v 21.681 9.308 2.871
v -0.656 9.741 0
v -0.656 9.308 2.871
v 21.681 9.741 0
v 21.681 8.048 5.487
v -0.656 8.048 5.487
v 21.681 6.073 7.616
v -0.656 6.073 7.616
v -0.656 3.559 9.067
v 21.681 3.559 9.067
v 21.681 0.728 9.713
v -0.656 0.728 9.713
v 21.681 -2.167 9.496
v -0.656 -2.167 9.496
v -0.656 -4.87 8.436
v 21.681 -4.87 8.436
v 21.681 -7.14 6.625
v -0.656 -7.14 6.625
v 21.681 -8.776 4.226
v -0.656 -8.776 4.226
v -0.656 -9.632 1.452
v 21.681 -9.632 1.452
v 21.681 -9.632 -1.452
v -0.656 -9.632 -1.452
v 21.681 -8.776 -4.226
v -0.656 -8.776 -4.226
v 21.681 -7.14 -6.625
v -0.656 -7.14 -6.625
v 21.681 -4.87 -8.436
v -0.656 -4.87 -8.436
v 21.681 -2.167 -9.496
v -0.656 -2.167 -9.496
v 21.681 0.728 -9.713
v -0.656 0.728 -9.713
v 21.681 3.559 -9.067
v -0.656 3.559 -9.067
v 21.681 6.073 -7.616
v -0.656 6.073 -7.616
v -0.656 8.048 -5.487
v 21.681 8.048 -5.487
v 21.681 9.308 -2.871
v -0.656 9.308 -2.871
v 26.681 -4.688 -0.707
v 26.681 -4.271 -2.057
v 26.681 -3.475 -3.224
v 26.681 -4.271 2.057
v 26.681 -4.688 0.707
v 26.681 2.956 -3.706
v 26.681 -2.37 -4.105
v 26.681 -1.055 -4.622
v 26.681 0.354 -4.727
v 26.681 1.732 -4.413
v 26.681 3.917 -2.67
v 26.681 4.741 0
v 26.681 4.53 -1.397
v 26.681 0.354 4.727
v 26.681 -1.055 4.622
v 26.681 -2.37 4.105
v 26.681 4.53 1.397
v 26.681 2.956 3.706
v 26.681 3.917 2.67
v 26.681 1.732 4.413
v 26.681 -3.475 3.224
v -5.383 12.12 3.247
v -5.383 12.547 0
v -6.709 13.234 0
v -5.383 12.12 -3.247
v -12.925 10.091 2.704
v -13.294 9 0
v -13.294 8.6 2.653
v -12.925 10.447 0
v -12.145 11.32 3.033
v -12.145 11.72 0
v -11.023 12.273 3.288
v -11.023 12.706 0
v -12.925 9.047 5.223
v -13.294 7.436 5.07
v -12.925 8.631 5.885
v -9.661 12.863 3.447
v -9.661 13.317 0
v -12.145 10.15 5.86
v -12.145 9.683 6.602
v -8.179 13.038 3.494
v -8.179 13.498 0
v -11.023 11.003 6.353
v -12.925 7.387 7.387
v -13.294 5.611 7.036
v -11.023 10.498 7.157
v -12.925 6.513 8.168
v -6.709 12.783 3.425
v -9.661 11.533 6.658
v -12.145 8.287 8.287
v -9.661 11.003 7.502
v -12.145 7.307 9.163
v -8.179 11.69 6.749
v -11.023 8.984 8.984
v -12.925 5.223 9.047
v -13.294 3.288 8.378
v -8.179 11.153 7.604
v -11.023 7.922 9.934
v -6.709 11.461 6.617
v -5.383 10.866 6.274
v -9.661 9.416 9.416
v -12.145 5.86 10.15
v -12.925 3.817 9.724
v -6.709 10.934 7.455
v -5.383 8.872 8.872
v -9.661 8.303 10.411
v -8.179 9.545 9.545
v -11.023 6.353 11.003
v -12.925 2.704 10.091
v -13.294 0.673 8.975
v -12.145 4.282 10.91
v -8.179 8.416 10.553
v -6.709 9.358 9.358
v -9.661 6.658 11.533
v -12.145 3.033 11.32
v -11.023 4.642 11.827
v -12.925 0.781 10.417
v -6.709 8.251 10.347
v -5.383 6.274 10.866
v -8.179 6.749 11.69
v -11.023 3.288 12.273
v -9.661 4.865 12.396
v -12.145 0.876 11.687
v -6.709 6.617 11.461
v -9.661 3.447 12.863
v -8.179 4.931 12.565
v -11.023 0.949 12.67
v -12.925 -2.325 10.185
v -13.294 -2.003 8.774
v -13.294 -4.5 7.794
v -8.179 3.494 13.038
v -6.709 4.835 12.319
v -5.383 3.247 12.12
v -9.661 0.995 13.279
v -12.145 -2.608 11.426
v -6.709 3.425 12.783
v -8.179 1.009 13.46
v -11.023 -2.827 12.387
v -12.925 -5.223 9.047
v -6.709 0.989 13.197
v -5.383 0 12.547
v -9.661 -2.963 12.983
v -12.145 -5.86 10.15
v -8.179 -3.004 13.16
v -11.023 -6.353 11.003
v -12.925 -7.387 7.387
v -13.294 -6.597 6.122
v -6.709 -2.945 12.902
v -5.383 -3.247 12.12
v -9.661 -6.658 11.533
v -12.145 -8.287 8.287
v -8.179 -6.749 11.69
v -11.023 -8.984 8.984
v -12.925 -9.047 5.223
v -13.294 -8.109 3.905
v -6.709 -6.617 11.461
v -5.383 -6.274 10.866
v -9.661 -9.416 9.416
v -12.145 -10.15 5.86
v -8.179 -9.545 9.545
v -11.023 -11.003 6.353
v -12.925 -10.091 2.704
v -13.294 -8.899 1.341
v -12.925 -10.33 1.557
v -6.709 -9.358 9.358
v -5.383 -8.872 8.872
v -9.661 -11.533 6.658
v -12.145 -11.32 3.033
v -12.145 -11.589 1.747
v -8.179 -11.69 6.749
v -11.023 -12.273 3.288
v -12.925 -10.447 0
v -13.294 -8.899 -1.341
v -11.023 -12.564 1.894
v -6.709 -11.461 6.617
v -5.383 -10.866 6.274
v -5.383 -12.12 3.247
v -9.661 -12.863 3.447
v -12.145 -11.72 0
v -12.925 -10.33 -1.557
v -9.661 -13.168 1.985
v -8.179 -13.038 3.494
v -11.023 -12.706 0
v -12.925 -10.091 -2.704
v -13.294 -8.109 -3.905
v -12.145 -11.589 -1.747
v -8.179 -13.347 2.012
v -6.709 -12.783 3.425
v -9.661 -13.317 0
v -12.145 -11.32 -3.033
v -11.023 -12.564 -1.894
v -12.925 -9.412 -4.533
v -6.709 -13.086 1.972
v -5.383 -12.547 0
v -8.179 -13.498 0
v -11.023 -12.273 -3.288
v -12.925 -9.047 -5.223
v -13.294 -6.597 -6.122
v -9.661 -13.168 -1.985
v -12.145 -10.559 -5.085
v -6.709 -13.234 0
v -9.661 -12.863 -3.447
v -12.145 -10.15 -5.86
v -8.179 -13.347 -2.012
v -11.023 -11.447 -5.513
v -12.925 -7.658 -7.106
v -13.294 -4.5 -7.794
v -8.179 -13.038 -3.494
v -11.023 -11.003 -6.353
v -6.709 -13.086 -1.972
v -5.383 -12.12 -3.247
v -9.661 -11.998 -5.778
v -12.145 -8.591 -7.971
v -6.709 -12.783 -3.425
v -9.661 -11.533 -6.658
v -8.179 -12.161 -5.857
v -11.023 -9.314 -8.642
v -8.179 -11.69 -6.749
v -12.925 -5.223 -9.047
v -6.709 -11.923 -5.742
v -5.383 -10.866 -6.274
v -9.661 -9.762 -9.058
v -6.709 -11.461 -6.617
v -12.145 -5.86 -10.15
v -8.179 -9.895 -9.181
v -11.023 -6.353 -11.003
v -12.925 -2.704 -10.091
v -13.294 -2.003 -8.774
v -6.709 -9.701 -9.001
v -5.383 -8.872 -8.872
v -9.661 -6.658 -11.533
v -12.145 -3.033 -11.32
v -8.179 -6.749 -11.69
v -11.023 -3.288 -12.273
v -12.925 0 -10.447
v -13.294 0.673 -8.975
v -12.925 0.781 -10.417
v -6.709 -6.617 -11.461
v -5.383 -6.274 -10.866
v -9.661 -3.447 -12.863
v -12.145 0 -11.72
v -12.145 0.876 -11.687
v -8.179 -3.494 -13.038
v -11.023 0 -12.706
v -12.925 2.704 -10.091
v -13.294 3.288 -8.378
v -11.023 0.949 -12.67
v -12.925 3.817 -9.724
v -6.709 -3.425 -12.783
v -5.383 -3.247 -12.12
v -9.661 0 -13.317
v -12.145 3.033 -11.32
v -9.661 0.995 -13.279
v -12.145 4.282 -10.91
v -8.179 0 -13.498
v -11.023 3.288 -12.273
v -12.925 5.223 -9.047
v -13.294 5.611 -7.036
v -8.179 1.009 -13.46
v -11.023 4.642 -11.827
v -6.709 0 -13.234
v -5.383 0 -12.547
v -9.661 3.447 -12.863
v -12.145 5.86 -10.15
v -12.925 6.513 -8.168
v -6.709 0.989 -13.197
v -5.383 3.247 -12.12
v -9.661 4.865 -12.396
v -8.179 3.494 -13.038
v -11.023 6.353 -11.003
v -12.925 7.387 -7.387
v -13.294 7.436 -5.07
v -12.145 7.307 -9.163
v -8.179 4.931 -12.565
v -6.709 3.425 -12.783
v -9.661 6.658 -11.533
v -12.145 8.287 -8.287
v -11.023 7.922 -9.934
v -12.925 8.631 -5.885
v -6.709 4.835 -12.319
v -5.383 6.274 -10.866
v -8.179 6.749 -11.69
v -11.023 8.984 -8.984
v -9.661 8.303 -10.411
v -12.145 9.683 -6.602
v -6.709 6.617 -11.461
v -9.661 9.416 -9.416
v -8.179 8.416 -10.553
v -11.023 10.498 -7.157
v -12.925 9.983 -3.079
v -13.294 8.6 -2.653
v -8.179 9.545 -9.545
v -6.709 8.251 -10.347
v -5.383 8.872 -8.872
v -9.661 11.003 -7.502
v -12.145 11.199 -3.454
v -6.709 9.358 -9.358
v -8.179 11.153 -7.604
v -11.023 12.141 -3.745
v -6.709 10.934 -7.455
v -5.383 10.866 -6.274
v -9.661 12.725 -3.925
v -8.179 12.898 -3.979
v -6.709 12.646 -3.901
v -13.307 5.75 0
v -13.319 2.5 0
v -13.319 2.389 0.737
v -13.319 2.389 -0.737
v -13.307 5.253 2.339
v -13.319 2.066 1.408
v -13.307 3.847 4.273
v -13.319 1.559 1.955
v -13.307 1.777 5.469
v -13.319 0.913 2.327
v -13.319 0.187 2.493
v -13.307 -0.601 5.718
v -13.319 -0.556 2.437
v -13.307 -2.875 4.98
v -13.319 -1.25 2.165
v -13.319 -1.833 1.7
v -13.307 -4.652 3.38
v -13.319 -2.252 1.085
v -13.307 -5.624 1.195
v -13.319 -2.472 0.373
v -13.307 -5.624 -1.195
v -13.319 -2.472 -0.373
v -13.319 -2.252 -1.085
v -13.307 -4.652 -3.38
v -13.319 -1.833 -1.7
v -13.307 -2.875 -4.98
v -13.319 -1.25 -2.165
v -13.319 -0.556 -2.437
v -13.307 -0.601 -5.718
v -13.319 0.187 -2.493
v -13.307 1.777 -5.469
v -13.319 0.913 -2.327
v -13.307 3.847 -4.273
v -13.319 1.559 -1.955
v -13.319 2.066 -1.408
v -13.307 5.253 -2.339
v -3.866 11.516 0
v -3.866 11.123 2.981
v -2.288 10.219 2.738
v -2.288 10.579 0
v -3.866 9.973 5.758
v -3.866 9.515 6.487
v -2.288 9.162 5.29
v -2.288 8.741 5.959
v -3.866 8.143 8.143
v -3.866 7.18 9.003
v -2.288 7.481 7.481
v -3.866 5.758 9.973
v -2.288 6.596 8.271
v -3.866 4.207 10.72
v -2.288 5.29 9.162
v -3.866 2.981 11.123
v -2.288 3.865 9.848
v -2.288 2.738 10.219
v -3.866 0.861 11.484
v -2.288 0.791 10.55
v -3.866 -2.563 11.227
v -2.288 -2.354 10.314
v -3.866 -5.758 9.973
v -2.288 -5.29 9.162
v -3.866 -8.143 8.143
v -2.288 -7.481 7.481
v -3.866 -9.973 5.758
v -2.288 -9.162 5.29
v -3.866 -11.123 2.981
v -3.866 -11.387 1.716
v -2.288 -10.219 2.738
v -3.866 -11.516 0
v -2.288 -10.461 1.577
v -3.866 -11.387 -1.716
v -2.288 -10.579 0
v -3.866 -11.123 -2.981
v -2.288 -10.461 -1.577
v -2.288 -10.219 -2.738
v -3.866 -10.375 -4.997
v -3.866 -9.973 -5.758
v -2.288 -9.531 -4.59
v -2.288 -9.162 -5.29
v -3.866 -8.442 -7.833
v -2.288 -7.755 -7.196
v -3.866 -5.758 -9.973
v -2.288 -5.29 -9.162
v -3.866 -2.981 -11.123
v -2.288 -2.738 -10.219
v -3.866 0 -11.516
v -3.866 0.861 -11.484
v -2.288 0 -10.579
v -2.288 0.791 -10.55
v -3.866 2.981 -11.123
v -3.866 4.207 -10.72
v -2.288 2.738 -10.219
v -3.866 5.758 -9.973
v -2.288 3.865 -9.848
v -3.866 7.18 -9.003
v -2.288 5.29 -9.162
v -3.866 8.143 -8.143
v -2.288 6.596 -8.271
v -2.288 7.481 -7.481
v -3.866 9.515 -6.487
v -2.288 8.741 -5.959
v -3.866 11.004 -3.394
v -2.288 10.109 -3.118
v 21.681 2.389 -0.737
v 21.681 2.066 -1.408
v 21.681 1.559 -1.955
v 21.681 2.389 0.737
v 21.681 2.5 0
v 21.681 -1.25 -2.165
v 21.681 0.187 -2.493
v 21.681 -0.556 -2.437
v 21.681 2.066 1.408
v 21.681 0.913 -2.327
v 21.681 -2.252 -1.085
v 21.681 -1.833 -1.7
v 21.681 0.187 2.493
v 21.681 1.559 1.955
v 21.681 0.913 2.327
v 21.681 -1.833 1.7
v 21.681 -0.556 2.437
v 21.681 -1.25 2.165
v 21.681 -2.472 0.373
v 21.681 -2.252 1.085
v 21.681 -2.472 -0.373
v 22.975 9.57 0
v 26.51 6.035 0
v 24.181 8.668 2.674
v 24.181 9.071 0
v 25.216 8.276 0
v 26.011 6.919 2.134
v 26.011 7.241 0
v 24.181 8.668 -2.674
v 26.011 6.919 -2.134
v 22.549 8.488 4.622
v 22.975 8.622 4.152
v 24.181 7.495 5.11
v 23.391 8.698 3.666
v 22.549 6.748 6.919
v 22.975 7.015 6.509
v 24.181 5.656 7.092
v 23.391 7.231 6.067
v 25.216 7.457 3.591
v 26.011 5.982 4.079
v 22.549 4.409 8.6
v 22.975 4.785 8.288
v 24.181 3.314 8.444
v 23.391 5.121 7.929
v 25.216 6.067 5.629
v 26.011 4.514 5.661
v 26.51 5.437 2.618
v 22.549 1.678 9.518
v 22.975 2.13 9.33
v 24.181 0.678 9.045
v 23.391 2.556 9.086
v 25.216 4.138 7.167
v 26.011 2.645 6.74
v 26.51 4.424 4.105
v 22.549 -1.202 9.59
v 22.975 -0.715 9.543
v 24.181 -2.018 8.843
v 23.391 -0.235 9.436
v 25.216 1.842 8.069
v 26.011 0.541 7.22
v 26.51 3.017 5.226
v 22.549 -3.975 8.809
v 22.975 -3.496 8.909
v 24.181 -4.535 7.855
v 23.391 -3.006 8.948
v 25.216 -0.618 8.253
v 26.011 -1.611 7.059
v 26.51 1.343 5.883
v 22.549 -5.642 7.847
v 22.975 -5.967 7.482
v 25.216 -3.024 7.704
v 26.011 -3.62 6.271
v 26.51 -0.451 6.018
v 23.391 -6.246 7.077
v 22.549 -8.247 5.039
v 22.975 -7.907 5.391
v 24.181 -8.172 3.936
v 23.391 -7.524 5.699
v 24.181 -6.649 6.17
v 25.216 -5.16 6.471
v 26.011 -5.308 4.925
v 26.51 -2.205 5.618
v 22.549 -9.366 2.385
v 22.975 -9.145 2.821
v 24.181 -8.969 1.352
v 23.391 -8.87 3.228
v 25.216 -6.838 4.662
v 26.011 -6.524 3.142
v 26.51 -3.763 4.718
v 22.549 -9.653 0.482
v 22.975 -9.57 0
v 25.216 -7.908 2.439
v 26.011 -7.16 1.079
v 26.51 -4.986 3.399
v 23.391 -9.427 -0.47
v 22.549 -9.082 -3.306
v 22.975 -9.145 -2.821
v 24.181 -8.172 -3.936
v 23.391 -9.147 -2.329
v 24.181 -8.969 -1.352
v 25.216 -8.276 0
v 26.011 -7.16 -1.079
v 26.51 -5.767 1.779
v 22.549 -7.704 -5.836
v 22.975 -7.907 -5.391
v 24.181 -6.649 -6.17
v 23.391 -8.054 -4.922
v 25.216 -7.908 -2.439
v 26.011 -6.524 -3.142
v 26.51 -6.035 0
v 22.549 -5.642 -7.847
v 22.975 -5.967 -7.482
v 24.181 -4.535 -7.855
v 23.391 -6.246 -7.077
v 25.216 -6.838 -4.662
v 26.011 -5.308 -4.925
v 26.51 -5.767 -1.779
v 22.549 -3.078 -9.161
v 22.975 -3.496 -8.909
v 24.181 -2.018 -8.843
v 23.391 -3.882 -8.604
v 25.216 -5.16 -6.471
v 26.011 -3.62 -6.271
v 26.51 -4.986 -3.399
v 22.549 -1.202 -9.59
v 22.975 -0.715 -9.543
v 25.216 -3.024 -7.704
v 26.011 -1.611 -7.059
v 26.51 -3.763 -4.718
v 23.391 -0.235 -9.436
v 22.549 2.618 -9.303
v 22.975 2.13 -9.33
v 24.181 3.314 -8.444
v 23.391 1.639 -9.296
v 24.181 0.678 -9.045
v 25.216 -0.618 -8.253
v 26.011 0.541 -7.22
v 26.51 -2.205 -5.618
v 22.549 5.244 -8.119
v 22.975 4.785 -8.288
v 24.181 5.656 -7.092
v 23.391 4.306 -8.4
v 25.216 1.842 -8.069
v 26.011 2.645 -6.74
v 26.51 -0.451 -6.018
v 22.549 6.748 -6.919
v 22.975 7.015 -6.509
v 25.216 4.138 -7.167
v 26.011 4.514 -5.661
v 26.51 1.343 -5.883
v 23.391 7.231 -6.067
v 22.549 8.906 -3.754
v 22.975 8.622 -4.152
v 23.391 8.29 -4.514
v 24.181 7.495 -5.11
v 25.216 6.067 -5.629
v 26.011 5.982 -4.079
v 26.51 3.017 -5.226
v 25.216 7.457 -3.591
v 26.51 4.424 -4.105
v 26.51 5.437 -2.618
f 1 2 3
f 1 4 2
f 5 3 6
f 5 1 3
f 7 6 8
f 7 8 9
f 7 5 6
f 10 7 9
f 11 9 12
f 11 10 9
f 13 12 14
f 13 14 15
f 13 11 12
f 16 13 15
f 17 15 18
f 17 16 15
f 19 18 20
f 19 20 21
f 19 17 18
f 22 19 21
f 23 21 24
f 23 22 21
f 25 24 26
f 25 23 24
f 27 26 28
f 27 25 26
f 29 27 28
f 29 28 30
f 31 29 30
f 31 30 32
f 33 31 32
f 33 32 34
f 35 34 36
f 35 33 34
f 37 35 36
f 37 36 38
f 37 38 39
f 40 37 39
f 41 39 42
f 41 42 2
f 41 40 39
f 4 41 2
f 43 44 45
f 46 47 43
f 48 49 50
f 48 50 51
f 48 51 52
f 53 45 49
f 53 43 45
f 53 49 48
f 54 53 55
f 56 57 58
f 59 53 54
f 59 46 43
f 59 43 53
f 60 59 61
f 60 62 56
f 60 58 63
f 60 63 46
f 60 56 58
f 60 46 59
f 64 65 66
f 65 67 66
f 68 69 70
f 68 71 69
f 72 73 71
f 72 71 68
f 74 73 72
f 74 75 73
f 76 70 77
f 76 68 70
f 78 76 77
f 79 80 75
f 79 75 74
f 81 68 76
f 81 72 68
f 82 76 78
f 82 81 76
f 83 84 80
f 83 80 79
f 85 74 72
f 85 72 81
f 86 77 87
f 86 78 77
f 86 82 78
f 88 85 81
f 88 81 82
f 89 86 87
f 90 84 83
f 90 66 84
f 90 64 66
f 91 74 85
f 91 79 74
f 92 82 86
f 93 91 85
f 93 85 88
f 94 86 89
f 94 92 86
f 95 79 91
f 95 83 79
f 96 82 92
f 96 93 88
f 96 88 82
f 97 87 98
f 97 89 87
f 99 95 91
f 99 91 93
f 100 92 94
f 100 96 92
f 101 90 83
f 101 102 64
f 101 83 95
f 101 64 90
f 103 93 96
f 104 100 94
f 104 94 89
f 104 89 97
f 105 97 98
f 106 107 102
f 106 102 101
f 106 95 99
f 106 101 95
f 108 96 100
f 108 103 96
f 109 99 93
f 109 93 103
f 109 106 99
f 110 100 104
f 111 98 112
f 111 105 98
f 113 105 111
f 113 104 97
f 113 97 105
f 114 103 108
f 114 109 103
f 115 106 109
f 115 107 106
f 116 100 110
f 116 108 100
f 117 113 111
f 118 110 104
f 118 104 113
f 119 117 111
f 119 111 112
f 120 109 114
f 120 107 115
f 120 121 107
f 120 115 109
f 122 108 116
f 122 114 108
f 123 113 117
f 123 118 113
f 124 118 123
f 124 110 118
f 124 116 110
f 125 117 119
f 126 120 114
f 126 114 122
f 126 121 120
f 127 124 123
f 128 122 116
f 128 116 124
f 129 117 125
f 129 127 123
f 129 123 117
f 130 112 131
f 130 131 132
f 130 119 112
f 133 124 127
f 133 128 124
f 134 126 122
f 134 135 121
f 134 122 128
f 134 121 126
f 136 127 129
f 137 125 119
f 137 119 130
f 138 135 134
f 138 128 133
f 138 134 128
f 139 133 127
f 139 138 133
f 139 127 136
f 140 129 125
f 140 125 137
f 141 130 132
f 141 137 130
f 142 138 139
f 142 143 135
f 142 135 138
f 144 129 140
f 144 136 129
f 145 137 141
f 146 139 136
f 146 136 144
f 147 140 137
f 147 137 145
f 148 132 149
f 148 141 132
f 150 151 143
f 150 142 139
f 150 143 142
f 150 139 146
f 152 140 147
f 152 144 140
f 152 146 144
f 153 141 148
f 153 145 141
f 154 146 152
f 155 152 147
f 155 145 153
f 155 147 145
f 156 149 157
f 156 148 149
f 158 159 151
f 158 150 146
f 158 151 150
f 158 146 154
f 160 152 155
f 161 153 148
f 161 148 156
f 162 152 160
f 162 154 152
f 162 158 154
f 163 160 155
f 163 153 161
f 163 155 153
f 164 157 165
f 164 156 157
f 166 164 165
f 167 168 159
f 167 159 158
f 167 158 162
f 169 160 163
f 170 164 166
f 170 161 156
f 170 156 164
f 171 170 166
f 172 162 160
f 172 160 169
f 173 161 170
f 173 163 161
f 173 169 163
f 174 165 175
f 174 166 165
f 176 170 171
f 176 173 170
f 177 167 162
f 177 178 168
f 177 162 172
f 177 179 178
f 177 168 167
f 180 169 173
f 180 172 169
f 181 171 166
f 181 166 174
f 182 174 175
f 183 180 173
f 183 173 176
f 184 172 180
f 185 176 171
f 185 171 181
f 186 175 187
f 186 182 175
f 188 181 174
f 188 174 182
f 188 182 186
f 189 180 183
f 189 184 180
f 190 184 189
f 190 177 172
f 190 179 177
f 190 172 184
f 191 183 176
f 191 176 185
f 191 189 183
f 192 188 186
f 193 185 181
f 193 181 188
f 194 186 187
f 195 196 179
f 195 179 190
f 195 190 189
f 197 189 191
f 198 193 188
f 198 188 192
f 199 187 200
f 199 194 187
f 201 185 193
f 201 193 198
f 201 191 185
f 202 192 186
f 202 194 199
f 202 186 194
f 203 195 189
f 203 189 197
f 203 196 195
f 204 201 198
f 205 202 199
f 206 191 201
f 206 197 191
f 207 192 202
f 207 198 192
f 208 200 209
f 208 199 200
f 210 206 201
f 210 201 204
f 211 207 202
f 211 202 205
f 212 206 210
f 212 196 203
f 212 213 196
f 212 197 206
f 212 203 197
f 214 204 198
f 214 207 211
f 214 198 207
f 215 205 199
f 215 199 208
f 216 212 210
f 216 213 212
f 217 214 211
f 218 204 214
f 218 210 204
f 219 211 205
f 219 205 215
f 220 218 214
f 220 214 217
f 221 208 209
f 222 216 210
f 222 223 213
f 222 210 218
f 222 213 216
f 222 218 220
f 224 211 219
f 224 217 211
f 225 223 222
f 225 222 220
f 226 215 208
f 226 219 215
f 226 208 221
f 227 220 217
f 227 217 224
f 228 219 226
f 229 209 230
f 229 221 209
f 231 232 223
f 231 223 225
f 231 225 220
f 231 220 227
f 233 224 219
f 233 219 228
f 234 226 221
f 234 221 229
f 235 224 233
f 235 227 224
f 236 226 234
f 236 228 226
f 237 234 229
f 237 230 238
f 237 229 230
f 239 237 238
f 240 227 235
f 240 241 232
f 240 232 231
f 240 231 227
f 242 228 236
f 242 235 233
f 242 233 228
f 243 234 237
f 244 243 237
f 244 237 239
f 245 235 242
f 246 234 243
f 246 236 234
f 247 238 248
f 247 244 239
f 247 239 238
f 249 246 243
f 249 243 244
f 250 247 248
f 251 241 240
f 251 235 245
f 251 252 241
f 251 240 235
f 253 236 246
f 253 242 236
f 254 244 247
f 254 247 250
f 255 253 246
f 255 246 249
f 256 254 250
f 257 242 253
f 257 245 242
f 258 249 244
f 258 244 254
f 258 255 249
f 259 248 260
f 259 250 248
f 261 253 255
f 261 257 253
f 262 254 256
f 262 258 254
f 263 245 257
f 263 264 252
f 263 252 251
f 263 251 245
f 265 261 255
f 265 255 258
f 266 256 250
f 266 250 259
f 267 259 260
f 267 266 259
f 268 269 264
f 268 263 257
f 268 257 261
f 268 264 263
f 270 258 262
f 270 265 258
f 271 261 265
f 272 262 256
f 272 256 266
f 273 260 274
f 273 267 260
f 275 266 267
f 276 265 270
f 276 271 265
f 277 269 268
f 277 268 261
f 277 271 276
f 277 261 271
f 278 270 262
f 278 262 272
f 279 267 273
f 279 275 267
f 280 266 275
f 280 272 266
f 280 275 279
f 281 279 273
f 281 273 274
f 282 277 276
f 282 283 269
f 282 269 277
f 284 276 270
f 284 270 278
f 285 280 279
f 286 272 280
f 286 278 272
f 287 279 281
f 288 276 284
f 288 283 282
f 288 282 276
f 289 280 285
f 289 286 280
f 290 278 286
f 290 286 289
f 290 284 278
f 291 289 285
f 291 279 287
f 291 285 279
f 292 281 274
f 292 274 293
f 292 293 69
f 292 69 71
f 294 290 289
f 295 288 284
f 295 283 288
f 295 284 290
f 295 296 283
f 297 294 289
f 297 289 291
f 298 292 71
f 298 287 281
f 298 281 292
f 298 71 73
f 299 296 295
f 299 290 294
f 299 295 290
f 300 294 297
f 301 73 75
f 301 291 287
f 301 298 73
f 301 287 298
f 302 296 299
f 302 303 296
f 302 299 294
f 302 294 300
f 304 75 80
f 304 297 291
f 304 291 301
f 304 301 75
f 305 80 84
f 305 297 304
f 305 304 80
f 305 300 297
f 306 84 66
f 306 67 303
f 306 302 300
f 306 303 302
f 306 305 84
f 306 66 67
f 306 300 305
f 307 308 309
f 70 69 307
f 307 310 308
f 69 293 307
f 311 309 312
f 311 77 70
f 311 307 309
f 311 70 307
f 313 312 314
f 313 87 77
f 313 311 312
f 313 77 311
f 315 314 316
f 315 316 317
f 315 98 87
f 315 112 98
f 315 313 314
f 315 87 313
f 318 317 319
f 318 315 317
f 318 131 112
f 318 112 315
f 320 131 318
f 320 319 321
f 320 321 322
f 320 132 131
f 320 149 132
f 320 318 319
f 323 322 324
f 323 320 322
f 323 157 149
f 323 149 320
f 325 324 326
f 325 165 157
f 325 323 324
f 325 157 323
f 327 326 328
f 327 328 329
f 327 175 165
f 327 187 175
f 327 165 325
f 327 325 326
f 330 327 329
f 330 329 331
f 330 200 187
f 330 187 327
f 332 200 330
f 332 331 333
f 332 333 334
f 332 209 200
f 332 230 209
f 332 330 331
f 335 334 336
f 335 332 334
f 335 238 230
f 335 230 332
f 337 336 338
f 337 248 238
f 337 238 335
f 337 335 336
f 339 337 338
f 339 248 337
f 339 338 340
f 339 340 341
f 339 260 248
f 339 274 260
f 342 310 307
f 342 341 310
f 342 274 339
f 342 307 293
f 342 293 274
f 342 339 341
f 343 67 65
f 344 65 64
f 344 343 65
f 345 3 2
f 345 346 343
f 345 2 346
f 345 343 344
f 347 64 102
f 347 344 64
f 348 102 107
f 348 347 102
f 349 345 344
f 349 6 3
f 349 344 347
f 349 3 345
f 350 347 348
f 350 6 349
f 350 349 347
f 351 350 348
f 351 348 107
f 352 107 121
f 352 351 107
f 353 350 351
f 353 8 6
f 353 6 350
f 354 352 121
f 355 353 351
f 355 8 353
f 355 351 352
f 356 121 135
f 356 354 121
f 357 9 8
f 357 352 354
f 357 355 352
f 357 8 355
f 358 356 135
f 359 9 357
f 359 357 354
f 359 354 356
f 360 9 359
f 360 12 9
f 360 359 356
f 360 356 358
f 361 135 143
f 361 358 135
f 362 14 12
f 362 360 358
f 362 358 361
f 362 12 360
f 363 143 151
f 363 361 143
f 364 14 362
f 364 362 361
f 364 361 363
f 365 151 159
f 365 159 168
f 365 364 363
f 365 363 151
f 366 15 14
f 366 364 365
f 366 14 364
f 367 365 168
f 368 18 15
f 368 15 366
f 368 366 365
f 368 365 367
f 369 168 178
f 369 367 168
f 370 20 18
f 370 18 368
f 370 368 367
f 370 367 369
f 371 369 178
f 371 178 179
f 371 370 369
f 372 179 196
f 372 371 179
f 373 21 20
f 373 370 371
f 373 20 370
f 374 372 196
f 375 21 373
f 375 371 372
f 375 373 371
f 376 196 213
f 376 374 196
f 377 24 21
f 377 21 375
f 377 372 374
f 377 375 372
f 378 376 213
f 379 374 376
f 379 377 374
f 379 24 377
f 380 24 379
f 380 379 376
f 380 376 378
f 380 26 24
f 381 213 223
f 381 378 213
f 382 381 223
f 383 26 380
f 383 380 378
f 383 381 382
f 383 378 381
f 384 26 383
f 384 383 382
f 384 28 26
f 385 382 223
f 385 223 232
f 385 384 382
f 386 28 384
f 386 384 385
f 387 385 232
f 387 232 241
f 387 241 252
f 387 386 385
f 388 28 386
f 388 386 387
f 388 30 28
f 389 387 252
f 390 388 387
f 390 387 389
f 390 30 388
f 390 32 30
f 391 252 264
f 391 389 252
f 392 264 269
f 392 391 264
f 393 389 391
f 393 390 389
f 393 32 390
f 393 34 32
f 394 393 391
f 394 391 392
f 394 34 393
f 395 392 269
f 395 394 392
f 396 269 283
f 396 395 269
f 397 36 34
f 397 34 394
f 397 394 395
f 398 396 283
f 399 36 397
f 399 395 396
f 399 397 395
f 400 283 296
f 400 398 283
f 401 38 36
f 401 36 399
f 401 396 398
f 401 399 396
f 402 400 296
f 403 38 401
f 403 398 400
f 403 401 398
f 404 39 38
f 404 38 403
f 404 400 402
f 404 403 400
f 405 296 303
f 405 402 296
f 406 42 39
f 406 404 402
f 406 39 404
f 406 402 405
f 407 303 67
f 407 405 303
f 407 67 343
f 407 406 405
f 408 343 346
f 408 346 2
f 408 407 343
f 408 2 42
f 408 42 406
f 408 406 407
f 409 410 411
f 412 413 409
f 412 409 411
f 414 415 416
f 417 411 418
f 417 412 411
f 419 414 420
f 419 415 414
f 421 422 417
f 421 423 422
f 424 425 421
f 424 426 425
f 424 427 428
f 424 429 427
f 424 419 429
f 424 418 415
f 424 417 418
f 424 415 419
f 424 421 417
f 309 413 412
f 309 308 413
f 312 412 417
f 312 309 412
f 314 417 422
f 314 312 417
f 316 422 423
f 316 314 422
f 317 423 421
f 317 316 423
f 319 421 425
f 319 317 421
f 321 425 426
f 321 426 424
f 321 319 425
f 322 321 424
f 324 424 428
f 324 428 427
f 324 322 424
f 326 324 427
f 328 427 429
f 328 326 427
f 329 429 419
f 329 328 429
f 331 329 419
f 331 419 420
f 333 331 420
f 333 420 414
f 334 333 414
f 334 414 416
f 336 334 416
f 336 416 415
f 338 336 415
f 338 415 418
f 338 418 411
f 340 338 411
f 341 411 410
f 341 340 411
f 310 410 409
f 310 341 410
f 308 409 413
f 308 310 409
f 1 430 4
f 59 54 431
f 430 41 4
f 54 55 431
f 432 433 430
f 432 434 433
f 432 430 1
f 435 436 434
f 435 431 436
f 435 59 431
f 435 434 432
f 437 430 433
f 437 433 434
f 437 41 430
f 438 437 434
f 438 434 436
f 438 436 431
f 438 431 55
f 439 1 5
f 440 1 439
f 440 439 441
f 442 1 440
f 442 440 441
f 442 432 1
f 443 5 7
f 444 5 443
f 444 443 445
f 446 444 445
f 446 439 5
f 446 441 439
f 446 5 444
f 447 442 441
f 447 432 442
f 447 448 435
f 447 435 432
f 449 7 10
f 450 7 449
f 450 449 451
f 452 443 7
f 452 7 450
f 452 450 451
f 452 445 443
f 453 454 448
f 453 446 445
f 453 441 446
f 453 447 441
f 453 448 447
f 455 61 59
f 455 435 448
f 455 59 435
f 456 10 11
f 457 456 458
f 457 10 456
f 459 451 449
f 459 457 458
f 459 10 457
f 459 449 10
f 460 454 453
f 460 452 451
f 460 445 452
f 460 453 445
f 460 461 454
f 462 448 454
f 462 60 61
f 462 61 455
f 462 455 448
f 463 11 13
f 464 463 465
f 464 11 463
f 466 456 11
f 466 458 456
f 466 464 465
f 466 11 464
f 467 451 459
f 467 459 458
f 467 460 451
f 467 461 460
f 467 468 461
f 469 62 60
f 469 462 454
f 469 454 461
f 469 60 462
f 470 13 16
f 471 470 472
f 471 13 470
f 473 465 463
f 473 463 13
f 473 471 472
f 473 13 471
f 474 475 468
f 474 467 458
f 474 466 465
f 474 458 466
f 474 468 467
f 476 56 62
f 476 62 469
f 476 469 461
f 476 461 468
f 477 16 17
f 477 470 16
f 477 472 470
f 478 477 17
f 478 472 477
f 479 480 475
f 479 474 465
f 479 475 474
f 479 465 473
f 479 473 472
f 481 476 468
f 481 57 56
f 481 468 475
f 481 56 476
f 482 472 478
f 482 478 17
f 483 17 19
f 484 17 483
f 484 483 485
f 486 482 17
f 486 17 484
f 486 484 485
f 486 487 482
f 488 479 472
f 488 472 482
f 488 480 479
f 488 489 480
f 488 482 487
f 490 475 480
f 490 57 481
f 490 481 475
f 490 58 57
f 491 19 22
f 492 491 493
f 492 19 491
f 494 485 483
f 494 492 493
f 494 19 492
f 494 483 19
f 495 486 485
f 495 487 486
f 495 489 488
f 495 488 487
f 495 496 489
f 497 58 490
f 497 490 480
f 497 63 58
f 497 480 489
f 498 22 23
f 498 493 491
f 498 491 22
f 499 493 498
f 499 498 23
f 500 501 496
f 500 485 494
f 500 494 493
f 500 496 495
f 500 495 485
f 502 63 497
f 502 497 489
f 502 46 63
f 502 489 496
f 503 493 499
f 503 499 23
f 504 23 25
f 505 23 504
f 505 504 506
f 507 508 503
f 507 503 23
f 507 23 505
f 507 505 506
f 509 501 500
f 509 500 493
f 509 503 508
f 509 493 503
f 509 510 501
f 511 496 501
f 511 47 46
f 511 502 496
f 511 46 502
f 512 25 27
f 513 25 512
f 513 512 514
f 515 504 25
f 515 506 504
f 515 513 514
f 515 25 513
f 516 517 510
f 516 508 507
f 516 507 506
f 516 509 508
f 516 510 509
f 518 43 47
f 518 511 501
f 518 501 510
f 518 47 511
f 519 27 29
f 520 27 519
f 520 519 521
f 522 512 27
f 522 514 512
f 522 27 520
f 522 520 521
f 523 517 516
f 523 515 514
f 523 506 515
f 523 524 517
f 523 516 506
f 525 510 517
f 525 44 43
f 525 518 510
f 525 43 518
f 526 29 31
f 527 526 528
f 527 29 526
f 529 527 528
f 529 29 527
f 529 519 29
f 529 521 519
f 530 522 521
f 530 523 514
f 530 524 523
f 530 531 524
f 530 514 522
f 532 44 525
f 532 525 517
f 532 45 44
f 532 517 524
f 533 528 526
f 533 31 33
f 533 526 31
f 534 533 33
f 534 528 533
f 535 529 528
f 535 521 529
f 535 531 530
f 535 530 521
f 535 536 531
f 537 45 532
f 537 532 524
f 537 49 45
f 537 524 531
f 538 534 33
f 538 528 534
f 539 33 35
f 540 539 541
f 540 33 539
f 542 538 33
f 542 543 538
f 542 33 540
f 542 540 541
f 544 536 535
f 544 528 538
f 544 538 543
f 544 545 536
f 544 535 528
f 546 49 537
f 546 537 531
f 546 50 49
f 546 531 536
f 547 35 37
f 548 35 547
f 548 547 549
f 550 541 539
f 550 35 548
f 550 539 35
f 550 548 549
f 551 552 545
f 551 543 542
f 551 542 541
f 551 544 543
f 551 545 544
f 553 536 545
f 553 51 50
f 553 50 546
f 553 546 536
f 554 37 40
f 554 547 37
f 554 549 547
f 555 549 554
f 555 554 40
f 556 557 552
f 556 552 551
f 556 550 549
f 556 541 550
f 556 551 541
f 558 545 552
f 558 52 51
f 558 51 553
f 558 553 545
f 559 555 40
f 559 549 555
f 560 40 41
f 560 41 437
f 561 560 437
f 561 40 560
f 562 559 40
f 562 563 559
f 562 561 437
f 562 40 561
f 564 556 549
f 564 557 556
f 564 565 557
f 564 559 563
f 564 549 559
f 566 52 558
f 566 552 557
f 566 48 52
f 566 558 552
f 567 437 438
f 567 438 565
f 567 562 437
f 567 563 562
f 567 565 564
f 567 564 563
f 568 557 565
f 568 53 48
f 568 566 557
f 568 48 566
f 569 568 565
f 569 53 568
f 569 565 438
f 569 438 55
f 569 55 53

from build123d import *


with BuildPart() as part:
    # Sketch1 → Revolve1 (revolve)
    with BuildSketch(Plane.XY):
        with BuildLine():
            Line((26.680645161, 2), (26.680645161, 0))
            Line((26.680645161, 0), (21.680645161, 0))
            Line((21.680645161, 0), (21.680645161, 2.5))
            Line((21.680645161, 2.5), (-13.319354839, 2.5))
            Line((-13.319354839, 2.5), (-13.294296878, 8.9999517))
            ThreePointArc((-13.294296878, 8.9999517), (-10.365170466, 13.062306261), (-5.383476734, 12.547297834))
            ThreePointArc((-5.383476734, 12.547297834), (-3.084370729, 11.035442519), (-0.656411636, 9.740602932))
            Line((-0.656411636, 9.740602932), (21.680645161, 9.740602932))
            ThreePointArc((21.680645161, 9.740602932), (25.216179067, 8.276136838), (26.680645161, 4.740602932))
            Line((26.680645161, 4.740602932), (26.680645161, 2))
        make_face()
    revolve(axis=Axis((-16.009165471, 0, 0), (1, 0, 0)))


solid = part.part
